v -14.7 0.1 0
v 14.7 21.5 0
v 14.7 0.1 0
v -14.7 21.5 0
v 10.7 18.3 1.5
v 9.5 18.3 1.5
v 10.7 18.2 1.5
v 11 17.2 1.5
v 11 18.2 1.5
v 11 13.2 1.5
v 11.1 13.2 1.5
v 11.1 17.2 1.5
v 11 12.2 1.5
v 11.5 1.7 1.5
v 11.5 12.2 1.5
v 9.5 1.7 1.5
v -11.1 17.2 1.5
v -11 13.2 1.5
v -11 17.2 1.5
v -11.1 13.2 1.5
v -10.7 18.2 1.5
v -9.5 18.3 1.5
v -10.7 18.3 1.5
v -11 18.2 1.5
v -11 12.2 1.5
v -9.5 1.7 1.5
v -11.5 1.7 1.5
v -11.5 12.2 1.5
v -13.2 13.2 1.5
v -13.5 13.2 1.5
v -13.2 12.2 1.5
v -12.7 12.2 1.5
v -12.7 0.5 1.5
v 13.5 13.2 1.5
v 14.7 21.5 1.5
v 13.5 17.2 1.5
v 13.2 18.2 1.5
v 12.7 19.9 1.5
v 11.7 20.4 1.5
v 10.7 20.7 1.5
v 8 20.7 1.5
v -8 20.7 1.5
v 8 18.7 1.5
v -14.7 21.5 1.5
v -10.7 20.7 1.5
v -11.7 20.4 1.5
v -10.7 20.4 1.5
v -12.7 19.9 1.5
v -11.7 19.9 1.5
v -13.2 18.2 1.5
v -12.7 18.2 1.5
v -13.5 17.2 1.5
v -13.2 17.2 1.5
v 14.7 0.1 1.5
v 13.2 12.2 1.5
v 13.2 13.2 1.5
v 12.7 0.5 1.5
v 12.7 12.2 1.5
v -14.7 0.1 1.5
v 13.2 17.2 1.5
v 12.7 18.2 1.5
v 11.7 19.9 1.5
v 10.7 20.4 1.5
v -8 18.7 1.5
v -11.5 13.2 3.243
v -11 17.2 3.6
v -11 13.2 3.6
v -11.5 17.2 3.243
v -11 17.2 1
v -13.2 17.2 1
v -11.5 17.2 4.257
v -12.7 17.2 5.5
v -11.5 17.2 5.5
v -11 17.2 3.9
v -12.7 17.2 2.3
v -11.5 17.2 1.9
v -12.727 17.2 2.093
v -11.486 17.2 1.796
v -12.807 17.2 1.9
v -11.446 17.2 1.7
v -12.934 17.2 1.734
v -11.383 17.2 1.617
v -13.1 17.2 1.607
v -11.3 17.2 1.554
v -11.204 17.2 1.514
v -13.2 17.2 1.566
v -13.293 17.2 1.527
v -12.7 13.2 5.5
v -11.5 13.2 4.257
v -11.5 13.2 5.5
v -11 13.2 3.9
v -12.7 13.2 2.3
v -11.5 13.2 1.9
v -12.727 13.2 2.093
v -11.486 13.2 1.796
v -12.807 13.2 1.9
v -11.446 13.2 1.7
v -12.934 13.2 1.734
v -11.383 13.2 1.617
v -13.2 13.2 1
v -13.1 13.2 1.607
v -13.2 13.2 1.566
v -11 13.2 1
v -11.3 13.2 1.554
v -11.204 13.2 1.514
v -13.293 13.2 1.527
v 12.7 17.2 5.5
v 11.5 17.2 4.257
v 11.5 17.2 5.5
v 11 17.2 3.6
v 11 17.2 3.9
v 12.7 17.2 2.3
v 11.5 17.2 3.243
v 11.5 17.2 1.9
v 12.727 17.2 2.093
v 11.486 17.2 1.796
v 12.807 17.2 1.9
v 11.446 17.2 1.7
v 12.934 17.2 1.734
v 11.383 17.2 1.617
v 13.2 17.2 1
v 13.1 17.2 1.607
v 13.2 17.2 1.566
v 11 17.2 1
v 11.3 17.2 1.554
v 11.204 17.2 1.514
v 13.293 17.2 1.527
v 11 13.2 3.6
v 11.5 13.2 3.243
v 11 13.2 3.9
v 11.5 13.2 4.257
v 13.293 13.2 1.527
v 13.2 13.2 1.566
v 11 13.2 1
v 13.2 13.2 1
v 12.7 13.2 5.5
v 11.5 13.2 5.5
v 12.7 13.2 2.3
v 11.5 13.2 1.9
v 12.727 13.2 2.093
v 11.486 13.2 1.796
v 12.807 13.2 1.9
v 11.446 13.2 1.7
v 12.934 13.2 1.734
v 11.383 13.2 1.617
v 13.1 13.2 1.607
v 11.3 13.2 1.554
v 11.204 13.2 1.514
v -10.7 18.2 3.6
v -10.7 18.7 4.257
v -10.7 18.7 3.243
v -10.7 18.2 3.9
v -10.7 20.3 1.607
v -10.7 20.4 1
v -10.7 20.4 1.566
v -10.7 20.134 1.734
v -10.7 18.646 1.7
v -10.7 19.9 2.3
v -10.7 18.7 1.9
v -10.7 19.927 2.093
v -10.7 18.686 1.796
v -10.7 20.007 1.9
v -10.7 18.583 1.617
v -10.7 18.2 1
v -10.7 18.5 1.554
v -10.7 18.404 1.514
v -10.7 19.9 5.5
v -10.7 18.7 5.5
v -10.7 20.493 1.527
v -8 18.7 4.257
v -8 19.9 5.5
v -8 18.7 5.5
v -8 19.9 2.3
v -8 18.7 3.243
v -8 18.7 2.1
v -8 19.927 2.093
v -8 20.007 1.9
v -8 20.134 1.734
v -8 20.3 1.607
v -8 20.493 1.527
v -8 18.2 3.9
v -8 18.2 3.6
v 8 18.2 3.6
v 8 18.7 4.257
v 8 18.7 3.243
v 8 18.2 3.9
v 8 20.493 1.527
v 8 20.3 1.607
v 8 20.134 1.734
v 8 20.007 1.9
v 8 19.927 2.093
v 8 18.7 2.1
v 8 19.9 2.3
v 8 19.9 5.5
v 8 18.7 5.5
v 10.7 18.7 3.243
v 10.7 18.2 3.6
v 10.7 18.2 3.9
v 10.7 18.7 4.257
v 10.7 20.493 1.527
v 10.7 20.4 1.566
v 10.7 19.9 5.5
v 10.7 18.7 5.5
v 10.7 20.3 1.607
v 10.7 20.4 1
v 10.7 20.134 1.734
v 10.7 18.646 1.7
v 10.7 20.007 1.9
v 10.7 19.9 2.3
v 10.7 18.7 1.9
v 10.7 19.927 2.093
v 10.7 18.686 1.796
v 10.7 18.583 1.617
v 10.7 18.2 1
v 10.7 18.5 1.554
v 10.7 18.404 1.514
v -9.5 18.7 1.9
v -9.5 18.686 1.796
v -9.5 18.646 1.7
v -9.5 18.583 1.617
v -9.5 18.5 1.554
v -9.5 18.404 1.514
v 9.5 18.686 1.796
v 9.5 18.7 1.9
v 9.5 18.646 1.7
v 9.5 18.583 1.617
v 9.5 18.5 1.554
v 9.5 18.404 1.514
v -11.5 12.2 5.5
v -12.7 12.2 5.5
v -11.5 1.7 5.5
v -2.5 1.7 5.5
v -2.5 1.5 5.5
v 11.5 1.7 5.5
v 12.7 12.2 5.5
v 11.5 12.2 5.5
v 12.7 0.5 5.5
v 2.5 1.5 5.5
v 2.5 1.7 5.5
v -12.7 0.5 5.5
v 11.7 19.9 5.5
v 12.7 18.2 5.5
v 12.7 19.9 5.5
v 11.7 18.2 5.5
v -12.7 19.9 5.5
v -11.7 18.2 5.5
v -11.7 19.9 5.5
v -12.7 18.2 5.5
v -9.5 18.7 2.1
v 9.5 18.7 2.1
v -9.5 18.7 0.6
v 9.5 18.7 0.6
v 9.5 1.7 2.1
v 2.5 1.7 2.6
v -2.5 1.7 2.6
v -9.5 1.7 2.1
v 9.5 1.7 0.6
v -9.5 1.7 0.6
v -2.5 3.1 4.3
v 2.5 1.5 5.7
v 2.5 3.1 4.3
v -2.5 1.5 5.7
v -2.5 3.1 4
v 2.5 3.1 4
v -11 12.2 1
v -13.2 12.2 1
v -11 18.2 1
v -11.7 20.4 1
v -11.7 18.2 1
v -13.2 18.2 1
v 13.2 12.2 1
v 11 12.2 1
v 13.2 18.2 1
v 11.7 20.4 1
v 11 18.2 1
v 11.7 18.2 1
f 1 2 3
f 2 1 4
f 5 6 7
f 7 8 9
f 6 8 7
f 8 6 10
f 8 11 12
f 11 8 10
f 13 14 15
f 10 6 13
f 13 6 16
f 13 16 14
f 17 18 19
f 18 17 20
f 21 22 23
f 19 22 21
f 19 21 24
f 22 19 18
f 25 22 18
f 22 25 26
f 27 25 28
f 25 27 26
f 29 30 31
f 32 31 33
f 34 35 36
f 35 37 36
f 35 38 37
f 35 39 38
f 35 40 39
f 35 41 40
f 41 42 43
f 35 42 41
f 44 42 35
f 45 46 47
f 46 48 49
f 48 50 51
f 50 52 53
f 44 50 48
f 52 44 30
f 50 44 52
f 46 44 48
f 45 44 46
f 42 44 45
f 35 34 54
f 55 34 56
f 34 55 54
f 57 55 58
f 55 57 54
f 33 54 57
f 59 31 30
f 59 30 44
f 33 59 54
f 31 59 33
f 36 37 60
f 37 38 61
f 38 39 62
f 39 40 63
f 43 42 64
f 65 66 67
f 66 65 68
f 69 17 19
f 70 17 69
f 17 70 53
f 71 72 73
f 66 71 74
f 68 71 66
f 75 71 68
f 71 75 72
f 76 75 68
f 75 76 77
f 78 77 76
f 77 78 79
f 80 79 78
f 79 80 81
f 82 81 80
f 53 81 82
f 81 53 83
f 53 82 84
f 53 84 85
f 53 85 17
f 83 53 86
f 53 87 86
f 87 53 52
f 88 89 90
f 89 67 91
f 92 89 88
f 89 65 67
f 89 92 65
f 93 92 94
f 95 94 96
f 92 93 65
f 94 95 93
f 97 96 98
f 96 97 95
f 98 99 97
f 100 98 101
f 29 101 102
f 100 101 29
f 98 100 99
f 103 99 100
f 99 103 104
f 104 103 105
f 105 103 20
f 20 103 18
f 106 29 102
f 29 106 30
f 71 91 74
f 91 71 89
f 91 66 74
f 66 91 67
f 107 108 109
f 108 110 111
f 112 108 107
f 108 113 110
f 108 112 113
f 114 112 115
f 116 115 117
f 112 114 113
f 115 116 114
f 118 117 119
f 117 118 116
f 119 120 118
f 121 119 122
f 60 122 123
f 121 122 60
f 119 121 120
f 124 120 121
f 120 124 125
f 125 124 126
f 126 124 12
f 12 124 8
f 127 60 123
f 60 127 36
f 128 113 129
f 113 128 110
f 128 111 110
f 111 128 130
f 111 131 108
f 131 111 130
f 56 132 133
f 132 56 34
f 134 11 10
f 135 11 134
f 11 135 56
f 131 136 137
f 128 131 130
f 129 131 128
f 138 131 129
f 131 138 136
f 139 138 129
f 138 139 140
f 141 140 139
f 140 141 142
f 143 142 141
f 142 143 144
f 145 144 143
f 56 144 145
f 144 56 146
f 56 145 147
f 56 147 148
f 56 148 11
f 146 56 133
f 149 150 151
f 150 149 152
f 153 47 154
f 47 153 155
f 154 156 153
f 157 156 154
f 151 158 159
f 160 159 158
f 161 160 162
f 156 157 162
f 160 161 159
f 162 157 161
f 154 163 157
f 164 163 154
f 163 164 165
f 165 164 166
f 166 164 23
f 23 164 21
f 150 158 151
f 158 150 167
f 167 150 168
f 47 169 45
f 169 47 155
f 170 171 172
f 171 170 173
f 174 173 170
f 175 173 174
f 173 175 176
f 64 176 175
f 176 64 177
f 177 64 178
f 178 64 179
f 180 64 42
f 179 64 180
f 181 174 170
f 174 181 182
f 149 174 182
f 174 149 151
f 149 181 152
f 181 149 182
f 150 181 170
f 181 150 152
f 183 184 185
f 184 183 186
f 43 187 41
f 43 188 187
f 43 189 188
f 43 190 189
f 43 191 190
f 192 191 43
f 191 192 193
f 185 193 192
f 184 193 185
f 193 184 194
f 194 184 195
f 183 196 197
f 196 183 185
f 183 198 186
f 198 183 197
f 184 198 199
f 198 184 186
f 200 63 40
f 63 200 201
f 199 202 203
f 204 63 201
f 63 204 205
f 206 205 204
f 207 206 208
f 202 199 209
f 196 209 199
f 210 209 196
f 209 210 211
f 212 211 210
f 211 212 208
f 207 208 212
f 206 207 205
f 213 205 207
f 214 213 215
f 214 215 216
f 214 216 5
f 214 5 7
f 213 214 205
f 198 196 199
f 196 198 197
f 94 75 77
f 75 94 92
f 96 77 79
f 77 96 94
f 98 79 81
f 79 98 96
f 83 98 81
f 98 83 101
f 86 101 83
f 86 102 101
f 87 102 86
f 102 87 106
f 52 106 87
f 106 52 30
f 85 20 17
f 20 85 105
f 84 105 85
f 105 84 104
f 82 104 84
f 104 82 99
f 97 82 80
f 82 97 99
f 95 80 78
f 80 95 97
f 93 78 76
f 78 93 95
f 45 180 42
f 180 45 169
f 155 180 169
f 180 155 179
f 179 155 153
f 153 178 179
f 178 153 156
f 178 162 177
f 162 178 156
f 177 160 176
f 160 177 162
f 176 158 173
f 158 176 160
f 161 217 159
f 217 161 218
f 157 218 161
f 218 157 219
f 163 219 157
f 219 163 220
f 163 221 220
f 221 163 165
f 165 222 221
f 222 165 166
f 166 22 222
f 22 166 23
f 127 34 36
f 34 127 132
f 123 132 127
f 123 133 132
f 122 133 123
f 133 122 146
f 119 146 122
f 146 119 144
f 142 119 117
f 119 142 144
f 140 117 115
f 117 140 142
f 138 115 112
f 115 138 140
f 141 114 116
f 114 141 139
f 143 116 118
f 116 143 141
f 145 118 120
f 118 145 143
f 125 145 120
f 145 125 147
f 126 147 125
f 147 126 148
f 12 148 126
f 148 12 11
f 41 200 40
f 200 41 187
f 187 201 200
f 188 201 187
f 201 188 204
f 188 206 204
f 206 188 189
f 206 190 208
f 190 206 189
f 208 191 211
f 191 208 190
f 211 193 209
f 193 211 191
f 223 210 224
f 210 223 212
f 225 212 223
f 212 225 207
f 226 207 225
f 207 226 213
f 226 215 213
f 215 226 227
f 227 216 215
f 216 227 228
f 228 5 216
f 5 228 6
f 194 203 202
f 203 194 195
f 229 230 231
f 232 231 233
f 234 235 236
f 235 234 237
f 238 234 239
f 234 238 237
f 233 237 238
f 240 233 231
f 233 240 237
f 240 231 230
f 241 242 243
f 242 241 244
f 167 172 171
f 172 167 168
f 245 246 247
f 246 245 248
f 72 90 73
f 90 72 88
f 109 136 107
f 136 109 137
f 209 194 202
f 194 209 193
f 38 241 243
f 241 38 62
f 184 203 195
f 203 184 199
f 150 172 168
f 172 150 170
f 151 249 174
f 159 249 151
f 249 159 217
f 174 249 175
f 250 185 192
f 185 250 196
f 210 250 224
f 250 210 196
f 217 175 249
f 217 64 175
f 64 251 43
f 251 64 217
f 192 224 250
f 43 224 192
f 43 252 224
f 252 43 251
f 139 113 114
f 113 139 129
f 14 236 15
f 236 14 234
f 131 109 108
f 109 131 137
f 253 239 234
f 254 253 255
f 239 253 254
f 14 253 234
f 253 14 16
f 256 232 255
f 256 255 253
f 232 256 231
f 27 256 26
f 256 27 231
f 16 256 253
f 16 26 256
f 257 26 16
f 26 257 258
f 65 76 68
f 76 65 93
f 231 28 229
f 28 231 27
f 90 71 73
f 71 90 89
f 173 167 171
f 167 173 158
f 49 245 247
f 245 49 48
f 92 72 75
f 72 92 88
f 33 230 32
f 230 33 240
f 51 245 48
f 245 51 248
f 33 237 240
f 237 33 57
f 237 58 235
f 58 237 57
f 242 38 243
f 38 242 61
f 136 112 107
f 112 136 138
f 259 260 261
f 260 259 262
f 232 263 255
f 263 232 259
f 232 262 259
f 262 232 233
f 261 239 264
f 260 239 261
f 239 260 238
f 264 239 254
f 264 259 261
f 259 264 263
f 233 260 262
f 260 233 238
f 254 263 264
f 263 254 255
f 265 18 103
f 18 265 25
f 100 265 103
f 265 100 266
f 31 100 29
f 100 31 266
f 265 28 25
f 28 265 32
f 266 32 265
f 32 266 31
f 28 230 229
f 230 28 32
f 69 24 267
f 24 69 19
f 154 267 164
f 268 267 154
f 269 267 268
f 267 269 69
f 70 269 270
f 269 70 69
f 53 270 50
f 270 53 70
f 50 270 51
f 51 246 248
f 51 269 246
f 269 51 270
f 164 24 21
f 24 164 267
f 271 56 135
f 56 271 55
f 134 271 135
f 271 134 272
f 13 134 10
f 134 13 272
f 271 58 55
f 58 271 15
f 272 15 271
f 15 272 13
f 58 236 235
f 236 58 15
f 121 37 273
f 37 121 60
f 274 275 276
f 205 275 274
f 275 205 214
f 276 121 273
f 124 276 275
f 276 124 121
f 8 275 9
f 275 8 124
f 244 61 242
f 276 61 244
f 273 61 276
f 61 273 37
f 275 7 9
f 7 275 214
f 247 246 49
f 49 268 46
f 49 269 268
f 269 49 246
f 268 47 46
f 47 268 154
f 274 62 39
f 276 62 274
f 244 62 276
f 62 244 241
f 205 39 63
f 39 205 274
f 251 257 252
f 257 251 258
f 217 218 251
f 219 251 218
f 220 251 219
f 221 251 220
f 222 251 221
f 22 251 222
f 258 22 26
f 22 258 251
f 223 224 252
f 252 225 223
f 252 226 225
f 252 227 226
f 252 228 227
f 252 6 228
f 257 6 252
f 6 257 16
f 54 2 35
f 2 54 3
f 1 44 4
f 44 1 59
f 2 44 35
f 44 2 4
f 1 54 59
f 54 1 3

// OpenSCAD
// Radar fit gauge, print first: only the shell's face and seats round the Radar, cut from the real shell()
// parts: radar-gauge
// so every depth is the shell's. Print flat, face down. See gauge_radar() in model.scad.
include <model.scad>
view = "gauge_radar";
